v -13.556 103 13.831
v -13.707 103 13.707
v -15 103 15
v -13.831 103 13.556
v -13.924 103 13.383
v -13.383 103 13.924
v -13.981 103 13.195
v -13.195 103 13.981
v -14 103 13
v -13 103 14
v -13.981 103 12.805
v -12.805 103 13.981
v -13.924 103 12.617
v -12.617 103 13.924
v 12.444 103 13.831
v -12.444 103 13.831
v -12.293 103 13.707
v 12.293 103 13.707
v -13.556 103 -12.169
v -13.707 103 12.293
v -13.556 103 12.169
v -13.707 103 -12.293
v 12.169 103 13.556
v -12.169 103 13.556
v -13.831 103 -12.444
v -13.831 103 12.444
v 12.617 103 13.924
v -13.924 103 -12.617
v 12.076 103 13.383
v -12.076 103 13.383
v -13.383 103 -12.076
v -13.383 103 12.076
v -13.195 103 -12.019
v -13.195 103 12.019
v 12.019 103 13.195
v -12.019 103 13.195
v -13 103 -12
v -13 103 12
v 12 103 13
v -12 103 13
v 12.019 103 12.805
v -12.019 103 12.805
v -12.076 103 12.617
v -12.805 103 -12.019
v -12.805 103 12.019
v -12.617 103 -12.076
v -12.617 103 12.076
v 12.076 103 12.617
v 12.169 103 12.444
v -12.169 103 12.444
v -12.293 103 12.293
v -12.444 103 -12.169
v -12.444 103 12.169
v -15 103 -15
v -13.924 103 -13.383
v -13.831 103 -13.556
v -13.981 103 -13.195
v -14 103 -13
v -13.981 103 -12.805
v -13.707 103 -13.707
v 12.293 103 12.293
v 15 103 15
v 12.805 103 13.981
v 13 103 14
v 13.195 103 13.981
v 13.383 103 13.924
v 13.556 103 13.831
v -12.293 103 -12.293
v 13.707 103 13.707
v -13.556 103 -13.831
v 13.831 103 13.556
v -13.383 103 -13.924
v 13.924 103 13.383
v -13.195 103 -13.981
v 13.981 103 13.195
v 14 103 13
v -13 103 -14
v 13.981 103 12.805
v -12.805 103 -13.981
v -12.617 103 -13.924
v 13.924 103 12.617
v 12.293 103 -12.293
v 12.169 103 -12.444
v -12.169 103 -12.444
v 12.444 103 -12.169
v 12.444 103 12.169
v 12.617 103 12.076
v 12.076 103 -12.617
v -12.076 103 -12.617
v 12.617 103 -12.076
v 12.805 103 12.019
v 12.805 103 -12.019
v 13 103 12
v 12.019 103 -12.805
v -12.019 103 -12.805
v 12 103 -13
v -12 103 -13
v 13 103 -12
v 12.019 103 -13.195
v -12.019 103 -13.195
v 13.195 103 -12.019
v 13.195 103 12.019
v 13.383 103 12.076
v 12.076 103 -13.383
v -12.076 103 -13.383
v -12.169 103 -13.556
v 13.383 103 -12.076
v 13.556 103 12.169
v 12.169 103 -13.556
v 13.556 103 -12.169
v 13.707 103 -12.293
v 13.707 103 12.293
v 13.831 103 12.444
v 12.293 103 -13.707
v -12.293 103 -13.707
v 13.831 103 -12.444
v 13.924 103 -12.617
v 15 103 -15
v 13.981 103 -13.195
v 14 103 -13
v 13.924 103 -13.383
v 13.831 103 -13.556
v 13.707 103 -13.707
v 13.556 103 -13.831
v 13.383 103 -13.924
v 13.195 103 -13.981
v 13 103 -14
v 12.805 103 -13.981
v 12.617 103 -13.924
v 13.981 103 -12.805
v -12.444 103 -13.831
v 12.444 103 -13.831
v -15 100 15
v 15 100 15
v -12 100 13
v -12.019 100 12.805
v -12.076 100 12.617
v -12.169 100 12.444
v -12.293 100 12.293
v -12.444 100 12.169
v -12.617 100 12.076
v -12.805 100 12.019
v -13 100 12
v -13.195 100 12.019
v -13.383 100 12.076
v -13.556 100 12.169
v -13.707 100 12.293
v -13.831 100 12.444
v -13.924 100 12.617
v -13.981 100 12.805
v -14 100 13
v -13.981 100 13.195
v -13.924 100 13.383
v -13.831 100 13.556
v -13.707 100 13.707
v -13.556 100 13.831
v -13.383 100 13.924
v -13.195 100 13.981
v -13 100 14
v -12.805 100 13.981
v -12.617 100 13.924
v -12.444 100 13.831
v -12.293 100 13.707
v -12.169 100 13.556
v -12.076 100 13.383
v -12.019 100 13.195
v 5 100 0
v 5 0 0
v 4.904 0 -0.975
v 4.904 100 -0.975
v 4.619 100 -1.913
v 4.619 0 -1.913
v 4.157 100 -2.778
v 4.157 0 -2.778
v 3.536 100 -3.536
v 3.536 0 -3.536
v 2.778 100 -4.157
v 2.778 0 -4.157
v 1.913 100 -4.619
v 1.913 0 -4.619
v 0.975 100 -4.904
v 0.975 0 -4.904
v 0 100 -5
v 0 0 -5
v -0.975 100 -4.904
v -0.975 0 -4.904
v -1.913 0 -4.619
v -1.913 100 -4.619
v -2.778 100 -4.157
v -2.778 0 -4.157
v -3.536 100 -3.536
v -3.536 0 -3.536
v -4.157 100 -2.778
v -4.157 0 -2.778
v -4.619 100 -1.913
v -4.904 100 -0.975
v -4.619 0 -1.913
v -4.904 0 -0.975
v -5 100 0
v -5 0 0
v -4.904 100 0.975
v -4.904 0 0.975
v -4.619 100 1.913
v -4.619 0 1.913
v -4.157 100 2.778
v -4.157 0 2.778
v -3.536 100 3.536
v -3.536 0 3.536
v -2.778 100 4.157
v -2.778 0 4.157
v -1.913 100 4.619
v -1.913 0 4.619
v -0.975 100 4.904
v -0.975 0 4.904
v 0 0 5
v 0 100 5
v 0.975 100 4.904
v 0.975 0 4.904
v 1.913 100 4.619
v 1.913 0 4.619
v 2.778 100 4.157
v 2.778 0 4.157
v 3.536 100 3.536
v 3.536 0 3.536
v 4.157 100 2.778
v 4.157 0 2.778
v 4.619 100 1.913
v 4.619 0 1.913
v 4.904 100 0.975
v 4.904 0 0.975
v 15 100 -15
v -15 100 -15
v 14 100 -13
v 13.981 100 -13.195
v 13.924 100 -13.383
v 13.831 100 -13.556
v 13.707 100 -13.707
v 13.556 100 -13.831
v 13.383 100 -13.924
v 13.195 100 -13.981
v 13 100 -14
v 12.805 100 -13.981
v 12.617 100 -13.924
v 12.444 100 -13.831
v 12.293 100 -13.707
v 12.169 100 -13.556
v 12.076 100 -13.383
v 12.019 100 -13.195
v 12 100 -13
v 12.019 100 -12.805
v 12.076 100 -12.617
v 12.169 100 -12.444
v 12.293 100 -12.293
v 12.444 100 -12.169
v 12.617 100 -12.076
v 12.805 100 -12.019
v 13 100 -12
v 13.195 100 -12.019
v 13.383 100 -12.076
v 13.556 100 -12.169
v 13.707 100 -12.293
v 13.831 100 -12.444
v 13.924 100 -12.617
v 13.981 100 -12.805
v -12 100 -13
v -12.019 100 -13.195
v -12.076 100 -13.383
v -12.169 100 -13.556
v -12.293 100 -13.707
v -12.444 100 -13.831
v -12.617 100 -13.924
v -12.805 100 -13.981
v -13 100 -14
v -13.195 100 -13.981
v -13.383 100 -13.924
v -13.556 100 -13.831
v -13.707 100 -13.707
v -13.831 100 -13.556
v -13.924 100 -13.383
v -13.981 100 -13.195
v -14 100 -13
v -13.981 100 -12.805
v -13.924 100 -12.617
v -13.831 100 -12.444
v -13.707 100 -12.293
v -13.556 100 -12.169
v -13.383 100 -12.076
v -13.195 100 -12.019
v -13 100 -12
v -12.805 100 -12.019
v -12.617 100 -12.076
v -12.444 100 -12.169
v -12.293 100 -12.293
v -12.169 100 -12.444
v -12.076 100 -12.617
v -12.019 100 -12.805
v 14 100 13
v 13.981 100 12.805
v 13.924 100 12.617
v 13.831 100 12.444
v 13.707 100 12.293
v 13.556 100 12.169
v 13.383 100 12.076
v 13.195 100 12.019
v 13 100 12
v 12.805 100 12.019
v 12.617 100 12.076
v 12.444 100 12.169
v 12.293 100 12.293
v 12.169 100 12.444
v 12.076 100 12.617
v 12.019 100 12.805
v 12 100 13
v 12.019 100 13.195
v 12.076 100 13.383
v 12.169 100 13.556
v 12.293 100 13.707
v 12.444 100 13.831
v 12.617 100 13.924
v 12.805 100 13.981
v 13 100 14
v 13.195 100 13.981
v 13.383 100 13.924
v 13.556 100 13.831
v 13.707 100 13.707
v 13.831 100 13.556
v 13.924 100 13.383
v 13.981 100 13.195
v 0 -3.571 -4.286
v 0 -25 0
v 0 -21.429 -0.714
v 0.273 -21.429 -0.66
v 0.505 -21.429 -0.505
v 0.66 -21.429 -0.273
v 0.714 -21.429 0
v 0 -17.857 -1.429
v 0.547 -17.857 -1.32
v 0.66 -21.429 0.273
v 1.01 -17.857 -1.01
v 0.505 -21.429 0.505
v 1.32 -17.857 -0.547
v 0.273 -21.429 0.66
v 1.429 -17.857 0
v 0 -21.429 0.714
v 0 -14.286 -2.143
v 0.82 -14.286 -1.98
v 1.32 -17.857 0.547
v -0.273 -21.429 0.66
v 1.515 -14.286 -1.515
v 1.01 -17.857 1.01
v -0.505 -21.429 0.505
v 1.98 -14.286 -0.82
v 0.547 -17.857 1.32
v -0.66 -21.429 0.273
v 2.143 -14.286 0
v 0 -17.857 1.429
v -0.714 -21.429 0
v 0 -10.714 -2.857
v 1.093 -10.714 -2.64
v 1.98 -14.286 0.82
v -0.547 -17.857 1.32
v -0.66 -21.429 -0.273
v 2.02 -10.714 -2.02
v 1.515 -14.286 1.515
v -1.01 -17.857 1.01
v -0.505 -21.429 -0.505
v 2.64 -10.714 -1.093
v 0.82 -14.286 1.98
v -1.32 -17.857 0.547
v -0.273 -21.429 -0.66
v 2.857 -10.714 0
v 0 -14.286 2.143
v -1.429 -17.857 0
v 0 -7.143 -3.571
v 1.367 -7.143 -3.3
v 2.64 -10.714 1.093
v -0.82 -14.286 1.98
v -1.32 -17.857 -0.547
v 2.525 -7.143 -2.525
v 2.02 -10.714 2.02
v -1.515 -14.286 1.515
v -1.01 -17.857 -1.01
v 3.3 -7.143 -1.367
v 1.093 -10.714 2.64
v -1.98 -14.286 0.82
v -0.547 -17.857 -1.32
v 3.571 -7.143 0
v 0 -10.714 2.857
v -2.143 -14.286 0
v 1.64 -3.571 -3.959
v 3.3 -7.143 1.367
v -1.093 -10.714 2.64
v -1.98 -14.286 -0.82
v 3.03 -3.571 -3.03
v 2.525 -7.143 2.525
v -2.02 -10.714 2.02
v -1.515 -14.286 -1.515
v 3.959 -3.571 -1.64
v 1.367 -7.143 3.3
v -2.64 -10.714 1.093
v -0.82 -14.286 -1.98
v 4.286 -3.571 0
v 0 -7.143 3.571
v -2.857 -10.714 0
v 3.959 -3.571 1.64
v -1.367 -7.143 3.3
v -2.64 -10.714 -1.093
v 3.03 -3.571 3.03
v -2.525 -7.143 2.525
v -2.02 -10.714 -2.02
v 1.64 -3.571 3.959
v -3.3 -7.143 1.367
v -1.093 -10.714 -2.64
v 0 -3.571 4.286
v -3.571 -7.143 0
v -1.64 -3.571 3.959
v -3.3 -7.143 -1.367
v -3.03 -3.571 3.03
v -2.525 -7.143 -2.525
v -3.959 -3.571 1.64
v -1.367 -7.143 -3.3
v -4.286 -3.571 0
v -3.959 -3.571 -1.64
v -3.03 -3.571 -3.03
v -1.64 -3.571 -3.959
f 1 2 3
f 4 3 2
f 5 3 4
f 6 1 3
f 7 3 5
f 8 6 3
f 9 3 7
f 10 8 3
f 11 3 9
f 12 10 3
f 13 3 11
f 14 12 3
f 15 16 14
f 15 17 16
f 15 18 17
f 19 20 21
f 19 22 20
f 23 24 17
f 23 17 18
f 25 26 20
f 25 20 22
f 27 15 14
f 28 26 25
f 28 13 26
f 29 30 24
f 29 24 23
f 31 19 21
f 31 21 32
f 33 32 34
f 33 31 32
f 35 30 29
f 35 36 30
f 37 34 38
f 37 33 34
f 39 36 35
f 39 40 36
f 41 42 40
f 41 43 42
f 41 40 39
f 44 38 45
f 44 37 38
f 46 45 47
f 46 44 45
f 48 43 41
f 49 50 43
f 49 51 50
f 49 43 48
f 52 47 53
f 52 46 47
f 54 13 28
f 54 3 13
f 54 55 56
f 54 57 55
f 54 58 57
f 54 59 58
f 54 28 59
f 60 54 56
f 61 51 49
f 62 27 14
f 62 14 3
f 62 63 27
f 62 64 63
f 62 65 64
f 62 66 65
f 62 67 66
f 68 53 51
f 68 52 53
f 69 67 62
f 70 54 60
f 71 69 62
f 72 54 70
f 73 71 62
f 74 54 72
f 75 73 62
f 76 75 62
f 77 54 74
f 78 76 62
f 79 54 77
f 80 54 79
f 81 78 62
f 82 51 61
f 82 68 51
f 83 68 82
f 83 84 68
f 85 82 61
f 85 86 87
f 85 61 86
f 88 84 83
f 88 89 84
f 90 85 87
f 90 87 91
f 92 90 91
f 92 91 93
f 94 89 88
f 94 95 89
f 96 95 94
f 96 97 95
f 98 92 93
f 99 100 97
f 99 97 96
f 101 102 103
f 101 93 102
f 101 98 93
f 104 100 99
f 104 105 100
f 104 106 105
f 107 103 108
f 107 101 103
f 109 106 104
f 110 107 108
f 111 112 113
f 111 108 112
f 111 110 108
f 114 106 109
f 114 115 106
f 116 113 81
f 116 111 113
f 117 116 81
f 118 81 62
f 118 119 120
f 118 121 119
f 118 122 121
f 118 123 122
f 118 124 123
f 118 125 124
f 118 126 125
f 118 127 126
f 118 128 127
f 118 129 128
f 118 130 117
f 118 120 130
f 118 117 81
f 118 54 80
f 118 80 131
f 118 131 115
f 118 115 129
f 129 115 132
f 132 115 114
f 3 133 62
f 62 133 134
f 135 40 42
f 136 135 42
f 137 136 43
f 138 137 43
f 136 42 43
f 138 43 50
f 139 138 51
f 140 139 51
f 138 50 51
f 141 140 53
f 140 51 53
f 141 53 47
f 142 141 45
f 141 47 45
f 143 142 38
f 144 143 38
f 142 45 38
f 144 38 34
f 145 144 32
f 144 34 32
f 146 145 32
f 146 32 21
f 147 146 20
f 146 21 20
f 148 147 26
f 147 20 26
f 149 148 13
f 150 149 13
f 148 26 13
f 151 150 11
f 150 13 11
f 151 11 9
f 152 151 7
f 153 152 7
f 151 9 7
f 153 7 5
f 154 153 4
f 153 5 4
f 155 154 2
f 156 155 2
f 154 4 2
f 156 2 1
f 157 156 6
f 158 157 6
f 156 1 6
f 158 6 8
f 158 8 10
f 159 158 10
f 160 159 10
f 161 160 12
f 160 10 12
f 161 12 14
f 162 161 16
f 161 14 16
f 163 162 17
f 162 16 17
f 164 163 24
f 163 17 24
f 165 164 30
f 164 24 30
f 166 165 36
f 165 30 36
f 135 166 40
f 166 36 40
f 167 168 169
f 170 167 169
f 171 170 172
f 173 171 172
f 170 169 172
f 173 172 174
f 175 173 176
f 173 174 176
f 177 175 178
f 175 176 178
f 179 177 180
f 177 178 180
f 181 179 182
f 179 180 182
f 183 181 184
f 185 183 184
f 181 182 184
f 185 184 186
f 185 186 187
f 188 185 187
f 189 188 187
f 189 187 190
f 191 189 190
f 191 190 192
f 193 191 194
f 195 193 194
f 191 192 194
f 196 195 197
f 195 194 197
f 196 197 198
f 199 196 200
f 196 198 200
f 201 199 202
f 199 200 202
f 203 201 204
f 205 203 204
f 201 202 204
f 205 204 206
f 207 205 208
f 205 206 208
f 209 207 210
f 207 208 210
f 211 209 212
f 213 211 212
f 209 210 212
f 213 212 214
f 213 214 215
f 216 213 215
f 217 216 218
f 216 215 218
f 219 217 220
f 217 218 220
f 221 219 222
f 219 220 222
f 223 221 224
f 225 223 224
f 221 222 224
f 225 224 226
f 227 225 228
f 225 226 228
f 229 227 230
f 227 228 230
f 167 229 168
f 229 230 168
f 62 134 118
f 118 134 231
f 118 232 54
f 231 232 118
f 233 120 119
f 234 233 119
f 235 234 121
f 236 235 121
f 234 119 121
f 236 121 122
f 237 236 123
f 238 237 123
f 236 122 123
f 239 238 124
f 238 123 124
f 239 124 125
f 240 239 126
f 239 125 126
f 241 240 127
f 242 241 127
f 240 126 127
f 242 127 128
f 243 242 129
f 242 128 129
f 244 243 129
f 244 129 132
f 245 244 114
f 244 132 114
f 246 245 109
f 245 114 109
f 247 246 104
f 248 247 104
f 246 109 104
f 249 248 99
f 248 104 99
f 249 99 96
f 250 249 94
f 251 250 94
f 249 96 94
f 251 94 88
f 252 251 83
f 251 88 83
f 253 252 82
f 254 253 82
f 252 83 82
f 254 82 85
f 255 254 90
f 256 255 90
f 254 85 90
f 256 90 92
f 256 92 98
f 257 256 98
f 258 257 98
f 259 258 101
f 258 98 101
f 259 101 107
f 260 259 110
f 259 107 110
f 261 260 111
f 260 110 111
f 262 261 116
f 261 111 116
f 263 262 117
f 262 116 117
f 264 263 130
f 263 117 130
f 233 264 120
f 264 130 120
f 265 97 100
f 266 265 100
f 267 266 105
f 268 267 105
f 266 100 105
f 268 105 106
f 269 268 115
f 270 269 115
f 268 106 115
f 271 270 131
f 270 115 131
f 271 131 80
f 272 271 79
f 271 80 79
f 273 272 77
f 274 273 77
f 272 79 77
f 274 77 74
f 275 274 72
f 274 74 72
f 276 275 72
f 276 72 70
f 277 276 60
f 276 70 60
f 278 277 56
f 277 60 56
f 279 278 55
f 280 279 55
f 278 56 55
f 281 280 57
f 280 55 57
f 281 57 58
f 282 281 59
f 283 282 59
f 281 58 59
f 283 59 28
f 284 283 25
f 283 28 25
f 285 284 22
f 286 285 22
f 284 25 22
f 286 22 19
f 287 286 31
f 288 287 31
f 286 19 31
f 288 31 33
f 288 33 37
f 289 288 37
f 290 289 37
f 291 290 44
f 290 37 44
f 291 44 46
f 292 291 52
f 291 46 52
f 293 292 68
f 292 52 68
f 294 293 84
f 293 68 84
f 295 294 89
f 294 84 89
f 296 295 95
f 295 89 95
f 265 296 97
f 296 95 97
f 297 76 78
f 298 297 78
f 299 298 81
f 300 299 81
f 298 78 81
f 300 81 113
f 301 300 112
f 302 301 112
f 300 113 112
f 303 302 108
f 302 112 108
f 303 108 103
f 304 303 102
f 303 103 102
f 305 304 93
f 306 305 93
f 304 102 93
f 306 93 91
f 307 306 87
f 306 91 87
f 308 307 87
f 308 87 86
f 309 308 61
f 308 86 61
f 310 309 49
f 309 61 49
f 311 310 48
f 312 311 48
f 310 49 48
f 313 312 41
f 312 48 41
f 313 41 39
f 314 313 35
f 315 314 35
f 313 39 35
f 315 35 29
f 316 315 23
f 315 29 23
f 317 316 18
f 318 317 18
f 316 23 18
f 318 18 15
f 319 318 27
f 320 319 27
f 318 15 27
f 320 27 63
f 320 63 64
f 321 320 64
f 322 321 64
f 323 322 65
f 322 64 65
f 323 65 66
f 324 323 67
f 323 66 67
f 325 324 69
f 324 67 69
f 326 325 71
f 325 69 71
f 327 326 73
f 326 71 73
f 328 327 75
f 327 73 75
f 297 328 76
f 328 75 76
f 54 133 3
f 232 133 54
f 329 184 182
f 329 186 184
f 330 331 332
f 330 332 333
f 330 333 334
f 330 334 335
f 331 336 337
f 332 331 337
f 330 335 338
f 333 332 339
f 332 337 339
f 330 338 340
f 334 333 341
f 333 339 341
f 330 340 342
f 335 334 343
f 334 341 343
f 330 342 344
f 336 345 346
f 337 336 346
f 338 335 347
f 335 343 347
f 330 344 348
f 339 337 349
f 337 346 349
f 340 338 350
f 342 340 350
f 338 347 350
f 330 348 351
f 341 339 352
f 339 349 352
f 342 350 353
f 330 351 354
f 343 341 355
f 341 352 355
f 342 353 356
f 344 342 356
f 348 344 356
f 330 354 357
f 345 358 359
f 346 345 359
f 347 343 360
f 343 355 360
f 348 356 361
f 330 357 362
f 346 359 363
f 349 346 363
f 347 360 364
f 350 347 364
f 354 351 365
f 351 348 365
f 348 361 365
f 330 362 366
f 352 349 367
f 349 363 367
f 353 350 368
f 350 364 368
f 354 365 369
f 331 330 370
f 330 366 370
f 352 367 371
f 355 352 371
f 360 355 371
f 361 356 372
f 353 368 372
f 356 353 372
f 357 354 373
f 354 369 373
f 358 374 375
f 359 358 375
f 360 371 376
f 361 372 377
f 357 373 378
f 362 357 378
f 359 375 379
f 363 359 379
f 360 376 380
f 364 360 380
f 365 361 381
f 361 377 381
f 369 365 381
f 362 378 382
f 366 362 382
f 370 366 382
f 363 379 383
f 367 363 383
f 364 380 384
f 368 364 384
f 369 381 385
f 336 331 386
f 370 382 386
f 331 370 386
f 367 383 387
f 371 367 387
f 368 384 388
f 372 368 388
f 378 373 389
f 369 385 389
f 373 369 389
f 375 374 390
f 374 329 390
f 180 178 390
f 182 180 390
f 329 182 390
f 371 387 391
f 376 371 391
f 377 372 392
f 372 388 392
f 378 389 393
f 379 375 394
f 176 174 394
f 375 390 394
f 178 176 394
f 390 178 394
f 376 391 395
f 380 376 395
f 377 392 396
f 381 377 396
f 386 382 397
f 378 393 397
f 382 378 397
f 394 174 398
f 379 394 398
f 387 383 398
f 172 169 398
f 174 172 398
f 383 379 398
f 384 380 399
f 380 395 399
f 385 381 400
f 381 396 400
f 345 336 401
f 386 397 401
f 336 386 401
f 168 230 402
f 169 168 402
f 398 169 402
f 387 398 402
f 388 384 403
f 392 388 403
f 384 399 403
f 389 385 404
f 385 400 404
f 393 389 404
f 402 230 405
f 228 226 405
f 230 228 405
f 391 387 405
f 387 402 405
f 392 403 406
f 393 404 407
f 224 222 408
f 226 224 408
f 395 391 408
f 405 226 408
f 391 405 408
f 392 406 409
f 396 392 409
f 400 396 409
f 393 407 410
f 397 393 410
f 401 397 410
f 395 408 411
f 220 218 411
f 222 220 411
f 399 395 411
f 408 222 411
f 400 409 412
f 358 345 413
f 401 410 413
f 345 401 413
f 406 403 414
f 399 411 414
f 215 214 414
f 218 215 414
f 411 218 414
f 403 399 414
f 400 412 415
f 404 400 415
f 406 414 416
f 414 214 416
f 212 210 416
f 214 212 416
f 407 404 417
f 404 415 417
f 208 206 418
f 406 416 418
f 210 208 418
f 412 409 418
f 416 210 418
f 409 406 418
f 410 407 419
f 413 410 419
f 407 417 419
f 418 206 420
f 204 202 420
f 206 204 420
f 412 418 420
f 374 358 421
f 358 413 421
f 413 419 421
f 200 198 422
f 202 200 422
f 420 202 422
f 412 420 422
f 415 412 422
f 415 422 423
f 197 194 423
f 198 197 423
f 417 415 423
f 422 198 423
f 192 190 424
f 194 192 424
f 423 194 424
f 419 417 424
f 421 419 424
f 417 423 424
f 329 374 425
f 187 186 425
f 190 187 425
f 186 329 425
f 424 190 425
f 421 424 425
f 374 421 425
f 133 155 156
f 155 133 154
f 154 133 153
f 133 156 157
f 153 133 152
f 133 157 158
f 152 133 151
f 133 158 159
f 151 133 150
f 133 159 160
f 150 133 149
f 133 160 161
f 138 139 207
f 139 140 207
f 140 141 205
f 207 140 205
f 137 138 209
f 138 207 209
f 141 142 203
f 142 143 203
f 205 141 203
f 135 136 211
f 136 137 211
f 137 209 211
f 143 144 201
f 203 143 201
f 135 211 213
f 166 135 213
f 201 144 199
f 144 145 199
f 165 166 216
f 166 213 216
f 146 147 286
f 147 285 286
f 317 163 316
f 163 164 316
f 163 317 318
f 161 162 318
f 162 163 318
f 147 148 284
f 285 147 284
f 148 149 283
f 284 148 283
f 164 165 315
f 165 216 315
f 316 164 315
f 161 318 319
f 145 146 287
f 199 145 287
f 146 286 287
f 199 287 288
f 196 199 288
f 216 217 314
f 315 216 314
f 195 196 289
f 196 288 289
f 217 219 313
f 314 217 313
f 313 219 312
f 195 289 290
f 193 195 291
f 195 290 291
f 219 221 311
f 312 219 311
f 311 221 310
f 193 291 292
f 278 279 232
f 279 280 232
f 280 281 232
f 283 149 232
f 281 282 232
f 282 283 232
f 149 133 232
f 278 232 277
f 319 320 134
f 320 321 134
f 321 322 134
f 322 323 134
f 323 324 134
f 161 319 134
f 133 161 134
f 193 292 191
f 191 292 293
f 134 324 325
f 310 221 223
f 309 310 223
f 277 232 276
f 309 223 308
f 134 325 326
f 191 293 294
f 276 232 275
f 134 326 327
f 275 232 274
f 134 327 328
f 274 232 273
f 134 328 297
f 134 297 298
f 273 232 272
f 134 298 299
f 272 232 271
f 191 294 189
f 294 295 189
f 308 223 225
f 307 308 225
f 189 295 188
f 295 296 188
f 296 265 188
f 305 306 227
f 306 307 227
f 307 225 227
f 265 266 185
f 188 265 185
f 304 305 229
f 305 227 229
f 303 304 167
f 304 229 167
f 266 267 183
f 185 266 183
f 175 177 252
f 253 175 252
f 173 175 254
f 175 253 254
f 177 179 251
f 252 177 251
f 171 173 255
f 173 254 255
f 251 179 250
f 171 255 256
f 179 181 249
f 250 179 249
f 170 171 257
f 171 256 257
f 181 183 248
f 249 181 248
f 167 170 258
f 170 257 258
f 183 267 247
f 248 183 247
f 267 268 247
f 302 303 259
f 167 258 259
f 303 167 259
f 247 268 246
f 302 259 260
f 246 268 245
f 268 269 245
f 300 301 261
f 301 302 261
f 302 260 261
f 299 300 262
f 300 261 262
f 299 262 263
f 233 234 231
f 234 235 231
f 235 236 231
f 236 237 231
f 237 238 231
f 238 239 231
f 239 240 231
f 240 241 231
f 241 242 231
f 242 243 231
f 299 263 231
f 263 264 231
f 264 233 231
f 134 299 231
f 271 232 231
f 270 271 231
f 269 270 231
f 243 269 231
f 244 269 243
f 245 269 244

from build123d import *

# Parameters (mm, degrees)
SKETCH1_R           = 5
BOSS_EXTRUDE1_DEPTH = 100
SKETCH3_W           = 30
SKETCH3_H           = 30
BOSS_EXTRUDE3_DEPTH = 3
SKETCH4_R           = 1
CUT_EXTRUDE1_DEPTH  = 3


with BuildPart() as part:
    # Sketch1 → Boss-Extrude1 (new body)
    with BuildSketch(Plane(origin=(0, 0, 0), x_dir=(1, 0, 0), z_dir=(0, 1, 0))):
        Circle(SKETCH1_R)
    extrude(amount=BOSS_EXTRUDE1_DEPTH)

    # Sketch3 → Boss-Extrude3 (add)
    with BuildSketch(Plane(origin=(0, 100, 0), x_dir=(1, 0, 0), z_dir=(0, 1, 0))):
        Rectangle(SKETCH3_W, SKETCH3_H)
    extrude(amount=BOSS_EXTRUDE3_DEPTH)

    # Sketch4 → Cut-Extrude1 (cut)
    with BuildSketch(Plane(origin=(0, 103, 0), x_dir=(1, 0, 0), z_dir=(0, 1, 0))):
        with Locations((-13, 13)):
            Circle(SKETCH4_R)
        with Locations((13, 13)):
            Circle(SKETCH4_R)
        with Locations((13, -13)):
            Circle(SKETCH4_R)
        with Locations((-13, -13)):
            Circle(SKETCH4_R)
    extrude(amount=-CUT_EXTRUDE1_DEPTH, mode=Mode.SUBTRACT)

    # Sketch5 → Revolve1 (revolve)
    with BuildSketch(Plane(origin=(0, 0, 0), x_dir=(0, 0, -1), z_dir=(1, 0, 0))):
        Polygon((0, 0), (0, -25), (5, 0), align=None)
    revolve(axis=Axis((0, 0, 0), (0, -1, 0)))


solid = part.part
